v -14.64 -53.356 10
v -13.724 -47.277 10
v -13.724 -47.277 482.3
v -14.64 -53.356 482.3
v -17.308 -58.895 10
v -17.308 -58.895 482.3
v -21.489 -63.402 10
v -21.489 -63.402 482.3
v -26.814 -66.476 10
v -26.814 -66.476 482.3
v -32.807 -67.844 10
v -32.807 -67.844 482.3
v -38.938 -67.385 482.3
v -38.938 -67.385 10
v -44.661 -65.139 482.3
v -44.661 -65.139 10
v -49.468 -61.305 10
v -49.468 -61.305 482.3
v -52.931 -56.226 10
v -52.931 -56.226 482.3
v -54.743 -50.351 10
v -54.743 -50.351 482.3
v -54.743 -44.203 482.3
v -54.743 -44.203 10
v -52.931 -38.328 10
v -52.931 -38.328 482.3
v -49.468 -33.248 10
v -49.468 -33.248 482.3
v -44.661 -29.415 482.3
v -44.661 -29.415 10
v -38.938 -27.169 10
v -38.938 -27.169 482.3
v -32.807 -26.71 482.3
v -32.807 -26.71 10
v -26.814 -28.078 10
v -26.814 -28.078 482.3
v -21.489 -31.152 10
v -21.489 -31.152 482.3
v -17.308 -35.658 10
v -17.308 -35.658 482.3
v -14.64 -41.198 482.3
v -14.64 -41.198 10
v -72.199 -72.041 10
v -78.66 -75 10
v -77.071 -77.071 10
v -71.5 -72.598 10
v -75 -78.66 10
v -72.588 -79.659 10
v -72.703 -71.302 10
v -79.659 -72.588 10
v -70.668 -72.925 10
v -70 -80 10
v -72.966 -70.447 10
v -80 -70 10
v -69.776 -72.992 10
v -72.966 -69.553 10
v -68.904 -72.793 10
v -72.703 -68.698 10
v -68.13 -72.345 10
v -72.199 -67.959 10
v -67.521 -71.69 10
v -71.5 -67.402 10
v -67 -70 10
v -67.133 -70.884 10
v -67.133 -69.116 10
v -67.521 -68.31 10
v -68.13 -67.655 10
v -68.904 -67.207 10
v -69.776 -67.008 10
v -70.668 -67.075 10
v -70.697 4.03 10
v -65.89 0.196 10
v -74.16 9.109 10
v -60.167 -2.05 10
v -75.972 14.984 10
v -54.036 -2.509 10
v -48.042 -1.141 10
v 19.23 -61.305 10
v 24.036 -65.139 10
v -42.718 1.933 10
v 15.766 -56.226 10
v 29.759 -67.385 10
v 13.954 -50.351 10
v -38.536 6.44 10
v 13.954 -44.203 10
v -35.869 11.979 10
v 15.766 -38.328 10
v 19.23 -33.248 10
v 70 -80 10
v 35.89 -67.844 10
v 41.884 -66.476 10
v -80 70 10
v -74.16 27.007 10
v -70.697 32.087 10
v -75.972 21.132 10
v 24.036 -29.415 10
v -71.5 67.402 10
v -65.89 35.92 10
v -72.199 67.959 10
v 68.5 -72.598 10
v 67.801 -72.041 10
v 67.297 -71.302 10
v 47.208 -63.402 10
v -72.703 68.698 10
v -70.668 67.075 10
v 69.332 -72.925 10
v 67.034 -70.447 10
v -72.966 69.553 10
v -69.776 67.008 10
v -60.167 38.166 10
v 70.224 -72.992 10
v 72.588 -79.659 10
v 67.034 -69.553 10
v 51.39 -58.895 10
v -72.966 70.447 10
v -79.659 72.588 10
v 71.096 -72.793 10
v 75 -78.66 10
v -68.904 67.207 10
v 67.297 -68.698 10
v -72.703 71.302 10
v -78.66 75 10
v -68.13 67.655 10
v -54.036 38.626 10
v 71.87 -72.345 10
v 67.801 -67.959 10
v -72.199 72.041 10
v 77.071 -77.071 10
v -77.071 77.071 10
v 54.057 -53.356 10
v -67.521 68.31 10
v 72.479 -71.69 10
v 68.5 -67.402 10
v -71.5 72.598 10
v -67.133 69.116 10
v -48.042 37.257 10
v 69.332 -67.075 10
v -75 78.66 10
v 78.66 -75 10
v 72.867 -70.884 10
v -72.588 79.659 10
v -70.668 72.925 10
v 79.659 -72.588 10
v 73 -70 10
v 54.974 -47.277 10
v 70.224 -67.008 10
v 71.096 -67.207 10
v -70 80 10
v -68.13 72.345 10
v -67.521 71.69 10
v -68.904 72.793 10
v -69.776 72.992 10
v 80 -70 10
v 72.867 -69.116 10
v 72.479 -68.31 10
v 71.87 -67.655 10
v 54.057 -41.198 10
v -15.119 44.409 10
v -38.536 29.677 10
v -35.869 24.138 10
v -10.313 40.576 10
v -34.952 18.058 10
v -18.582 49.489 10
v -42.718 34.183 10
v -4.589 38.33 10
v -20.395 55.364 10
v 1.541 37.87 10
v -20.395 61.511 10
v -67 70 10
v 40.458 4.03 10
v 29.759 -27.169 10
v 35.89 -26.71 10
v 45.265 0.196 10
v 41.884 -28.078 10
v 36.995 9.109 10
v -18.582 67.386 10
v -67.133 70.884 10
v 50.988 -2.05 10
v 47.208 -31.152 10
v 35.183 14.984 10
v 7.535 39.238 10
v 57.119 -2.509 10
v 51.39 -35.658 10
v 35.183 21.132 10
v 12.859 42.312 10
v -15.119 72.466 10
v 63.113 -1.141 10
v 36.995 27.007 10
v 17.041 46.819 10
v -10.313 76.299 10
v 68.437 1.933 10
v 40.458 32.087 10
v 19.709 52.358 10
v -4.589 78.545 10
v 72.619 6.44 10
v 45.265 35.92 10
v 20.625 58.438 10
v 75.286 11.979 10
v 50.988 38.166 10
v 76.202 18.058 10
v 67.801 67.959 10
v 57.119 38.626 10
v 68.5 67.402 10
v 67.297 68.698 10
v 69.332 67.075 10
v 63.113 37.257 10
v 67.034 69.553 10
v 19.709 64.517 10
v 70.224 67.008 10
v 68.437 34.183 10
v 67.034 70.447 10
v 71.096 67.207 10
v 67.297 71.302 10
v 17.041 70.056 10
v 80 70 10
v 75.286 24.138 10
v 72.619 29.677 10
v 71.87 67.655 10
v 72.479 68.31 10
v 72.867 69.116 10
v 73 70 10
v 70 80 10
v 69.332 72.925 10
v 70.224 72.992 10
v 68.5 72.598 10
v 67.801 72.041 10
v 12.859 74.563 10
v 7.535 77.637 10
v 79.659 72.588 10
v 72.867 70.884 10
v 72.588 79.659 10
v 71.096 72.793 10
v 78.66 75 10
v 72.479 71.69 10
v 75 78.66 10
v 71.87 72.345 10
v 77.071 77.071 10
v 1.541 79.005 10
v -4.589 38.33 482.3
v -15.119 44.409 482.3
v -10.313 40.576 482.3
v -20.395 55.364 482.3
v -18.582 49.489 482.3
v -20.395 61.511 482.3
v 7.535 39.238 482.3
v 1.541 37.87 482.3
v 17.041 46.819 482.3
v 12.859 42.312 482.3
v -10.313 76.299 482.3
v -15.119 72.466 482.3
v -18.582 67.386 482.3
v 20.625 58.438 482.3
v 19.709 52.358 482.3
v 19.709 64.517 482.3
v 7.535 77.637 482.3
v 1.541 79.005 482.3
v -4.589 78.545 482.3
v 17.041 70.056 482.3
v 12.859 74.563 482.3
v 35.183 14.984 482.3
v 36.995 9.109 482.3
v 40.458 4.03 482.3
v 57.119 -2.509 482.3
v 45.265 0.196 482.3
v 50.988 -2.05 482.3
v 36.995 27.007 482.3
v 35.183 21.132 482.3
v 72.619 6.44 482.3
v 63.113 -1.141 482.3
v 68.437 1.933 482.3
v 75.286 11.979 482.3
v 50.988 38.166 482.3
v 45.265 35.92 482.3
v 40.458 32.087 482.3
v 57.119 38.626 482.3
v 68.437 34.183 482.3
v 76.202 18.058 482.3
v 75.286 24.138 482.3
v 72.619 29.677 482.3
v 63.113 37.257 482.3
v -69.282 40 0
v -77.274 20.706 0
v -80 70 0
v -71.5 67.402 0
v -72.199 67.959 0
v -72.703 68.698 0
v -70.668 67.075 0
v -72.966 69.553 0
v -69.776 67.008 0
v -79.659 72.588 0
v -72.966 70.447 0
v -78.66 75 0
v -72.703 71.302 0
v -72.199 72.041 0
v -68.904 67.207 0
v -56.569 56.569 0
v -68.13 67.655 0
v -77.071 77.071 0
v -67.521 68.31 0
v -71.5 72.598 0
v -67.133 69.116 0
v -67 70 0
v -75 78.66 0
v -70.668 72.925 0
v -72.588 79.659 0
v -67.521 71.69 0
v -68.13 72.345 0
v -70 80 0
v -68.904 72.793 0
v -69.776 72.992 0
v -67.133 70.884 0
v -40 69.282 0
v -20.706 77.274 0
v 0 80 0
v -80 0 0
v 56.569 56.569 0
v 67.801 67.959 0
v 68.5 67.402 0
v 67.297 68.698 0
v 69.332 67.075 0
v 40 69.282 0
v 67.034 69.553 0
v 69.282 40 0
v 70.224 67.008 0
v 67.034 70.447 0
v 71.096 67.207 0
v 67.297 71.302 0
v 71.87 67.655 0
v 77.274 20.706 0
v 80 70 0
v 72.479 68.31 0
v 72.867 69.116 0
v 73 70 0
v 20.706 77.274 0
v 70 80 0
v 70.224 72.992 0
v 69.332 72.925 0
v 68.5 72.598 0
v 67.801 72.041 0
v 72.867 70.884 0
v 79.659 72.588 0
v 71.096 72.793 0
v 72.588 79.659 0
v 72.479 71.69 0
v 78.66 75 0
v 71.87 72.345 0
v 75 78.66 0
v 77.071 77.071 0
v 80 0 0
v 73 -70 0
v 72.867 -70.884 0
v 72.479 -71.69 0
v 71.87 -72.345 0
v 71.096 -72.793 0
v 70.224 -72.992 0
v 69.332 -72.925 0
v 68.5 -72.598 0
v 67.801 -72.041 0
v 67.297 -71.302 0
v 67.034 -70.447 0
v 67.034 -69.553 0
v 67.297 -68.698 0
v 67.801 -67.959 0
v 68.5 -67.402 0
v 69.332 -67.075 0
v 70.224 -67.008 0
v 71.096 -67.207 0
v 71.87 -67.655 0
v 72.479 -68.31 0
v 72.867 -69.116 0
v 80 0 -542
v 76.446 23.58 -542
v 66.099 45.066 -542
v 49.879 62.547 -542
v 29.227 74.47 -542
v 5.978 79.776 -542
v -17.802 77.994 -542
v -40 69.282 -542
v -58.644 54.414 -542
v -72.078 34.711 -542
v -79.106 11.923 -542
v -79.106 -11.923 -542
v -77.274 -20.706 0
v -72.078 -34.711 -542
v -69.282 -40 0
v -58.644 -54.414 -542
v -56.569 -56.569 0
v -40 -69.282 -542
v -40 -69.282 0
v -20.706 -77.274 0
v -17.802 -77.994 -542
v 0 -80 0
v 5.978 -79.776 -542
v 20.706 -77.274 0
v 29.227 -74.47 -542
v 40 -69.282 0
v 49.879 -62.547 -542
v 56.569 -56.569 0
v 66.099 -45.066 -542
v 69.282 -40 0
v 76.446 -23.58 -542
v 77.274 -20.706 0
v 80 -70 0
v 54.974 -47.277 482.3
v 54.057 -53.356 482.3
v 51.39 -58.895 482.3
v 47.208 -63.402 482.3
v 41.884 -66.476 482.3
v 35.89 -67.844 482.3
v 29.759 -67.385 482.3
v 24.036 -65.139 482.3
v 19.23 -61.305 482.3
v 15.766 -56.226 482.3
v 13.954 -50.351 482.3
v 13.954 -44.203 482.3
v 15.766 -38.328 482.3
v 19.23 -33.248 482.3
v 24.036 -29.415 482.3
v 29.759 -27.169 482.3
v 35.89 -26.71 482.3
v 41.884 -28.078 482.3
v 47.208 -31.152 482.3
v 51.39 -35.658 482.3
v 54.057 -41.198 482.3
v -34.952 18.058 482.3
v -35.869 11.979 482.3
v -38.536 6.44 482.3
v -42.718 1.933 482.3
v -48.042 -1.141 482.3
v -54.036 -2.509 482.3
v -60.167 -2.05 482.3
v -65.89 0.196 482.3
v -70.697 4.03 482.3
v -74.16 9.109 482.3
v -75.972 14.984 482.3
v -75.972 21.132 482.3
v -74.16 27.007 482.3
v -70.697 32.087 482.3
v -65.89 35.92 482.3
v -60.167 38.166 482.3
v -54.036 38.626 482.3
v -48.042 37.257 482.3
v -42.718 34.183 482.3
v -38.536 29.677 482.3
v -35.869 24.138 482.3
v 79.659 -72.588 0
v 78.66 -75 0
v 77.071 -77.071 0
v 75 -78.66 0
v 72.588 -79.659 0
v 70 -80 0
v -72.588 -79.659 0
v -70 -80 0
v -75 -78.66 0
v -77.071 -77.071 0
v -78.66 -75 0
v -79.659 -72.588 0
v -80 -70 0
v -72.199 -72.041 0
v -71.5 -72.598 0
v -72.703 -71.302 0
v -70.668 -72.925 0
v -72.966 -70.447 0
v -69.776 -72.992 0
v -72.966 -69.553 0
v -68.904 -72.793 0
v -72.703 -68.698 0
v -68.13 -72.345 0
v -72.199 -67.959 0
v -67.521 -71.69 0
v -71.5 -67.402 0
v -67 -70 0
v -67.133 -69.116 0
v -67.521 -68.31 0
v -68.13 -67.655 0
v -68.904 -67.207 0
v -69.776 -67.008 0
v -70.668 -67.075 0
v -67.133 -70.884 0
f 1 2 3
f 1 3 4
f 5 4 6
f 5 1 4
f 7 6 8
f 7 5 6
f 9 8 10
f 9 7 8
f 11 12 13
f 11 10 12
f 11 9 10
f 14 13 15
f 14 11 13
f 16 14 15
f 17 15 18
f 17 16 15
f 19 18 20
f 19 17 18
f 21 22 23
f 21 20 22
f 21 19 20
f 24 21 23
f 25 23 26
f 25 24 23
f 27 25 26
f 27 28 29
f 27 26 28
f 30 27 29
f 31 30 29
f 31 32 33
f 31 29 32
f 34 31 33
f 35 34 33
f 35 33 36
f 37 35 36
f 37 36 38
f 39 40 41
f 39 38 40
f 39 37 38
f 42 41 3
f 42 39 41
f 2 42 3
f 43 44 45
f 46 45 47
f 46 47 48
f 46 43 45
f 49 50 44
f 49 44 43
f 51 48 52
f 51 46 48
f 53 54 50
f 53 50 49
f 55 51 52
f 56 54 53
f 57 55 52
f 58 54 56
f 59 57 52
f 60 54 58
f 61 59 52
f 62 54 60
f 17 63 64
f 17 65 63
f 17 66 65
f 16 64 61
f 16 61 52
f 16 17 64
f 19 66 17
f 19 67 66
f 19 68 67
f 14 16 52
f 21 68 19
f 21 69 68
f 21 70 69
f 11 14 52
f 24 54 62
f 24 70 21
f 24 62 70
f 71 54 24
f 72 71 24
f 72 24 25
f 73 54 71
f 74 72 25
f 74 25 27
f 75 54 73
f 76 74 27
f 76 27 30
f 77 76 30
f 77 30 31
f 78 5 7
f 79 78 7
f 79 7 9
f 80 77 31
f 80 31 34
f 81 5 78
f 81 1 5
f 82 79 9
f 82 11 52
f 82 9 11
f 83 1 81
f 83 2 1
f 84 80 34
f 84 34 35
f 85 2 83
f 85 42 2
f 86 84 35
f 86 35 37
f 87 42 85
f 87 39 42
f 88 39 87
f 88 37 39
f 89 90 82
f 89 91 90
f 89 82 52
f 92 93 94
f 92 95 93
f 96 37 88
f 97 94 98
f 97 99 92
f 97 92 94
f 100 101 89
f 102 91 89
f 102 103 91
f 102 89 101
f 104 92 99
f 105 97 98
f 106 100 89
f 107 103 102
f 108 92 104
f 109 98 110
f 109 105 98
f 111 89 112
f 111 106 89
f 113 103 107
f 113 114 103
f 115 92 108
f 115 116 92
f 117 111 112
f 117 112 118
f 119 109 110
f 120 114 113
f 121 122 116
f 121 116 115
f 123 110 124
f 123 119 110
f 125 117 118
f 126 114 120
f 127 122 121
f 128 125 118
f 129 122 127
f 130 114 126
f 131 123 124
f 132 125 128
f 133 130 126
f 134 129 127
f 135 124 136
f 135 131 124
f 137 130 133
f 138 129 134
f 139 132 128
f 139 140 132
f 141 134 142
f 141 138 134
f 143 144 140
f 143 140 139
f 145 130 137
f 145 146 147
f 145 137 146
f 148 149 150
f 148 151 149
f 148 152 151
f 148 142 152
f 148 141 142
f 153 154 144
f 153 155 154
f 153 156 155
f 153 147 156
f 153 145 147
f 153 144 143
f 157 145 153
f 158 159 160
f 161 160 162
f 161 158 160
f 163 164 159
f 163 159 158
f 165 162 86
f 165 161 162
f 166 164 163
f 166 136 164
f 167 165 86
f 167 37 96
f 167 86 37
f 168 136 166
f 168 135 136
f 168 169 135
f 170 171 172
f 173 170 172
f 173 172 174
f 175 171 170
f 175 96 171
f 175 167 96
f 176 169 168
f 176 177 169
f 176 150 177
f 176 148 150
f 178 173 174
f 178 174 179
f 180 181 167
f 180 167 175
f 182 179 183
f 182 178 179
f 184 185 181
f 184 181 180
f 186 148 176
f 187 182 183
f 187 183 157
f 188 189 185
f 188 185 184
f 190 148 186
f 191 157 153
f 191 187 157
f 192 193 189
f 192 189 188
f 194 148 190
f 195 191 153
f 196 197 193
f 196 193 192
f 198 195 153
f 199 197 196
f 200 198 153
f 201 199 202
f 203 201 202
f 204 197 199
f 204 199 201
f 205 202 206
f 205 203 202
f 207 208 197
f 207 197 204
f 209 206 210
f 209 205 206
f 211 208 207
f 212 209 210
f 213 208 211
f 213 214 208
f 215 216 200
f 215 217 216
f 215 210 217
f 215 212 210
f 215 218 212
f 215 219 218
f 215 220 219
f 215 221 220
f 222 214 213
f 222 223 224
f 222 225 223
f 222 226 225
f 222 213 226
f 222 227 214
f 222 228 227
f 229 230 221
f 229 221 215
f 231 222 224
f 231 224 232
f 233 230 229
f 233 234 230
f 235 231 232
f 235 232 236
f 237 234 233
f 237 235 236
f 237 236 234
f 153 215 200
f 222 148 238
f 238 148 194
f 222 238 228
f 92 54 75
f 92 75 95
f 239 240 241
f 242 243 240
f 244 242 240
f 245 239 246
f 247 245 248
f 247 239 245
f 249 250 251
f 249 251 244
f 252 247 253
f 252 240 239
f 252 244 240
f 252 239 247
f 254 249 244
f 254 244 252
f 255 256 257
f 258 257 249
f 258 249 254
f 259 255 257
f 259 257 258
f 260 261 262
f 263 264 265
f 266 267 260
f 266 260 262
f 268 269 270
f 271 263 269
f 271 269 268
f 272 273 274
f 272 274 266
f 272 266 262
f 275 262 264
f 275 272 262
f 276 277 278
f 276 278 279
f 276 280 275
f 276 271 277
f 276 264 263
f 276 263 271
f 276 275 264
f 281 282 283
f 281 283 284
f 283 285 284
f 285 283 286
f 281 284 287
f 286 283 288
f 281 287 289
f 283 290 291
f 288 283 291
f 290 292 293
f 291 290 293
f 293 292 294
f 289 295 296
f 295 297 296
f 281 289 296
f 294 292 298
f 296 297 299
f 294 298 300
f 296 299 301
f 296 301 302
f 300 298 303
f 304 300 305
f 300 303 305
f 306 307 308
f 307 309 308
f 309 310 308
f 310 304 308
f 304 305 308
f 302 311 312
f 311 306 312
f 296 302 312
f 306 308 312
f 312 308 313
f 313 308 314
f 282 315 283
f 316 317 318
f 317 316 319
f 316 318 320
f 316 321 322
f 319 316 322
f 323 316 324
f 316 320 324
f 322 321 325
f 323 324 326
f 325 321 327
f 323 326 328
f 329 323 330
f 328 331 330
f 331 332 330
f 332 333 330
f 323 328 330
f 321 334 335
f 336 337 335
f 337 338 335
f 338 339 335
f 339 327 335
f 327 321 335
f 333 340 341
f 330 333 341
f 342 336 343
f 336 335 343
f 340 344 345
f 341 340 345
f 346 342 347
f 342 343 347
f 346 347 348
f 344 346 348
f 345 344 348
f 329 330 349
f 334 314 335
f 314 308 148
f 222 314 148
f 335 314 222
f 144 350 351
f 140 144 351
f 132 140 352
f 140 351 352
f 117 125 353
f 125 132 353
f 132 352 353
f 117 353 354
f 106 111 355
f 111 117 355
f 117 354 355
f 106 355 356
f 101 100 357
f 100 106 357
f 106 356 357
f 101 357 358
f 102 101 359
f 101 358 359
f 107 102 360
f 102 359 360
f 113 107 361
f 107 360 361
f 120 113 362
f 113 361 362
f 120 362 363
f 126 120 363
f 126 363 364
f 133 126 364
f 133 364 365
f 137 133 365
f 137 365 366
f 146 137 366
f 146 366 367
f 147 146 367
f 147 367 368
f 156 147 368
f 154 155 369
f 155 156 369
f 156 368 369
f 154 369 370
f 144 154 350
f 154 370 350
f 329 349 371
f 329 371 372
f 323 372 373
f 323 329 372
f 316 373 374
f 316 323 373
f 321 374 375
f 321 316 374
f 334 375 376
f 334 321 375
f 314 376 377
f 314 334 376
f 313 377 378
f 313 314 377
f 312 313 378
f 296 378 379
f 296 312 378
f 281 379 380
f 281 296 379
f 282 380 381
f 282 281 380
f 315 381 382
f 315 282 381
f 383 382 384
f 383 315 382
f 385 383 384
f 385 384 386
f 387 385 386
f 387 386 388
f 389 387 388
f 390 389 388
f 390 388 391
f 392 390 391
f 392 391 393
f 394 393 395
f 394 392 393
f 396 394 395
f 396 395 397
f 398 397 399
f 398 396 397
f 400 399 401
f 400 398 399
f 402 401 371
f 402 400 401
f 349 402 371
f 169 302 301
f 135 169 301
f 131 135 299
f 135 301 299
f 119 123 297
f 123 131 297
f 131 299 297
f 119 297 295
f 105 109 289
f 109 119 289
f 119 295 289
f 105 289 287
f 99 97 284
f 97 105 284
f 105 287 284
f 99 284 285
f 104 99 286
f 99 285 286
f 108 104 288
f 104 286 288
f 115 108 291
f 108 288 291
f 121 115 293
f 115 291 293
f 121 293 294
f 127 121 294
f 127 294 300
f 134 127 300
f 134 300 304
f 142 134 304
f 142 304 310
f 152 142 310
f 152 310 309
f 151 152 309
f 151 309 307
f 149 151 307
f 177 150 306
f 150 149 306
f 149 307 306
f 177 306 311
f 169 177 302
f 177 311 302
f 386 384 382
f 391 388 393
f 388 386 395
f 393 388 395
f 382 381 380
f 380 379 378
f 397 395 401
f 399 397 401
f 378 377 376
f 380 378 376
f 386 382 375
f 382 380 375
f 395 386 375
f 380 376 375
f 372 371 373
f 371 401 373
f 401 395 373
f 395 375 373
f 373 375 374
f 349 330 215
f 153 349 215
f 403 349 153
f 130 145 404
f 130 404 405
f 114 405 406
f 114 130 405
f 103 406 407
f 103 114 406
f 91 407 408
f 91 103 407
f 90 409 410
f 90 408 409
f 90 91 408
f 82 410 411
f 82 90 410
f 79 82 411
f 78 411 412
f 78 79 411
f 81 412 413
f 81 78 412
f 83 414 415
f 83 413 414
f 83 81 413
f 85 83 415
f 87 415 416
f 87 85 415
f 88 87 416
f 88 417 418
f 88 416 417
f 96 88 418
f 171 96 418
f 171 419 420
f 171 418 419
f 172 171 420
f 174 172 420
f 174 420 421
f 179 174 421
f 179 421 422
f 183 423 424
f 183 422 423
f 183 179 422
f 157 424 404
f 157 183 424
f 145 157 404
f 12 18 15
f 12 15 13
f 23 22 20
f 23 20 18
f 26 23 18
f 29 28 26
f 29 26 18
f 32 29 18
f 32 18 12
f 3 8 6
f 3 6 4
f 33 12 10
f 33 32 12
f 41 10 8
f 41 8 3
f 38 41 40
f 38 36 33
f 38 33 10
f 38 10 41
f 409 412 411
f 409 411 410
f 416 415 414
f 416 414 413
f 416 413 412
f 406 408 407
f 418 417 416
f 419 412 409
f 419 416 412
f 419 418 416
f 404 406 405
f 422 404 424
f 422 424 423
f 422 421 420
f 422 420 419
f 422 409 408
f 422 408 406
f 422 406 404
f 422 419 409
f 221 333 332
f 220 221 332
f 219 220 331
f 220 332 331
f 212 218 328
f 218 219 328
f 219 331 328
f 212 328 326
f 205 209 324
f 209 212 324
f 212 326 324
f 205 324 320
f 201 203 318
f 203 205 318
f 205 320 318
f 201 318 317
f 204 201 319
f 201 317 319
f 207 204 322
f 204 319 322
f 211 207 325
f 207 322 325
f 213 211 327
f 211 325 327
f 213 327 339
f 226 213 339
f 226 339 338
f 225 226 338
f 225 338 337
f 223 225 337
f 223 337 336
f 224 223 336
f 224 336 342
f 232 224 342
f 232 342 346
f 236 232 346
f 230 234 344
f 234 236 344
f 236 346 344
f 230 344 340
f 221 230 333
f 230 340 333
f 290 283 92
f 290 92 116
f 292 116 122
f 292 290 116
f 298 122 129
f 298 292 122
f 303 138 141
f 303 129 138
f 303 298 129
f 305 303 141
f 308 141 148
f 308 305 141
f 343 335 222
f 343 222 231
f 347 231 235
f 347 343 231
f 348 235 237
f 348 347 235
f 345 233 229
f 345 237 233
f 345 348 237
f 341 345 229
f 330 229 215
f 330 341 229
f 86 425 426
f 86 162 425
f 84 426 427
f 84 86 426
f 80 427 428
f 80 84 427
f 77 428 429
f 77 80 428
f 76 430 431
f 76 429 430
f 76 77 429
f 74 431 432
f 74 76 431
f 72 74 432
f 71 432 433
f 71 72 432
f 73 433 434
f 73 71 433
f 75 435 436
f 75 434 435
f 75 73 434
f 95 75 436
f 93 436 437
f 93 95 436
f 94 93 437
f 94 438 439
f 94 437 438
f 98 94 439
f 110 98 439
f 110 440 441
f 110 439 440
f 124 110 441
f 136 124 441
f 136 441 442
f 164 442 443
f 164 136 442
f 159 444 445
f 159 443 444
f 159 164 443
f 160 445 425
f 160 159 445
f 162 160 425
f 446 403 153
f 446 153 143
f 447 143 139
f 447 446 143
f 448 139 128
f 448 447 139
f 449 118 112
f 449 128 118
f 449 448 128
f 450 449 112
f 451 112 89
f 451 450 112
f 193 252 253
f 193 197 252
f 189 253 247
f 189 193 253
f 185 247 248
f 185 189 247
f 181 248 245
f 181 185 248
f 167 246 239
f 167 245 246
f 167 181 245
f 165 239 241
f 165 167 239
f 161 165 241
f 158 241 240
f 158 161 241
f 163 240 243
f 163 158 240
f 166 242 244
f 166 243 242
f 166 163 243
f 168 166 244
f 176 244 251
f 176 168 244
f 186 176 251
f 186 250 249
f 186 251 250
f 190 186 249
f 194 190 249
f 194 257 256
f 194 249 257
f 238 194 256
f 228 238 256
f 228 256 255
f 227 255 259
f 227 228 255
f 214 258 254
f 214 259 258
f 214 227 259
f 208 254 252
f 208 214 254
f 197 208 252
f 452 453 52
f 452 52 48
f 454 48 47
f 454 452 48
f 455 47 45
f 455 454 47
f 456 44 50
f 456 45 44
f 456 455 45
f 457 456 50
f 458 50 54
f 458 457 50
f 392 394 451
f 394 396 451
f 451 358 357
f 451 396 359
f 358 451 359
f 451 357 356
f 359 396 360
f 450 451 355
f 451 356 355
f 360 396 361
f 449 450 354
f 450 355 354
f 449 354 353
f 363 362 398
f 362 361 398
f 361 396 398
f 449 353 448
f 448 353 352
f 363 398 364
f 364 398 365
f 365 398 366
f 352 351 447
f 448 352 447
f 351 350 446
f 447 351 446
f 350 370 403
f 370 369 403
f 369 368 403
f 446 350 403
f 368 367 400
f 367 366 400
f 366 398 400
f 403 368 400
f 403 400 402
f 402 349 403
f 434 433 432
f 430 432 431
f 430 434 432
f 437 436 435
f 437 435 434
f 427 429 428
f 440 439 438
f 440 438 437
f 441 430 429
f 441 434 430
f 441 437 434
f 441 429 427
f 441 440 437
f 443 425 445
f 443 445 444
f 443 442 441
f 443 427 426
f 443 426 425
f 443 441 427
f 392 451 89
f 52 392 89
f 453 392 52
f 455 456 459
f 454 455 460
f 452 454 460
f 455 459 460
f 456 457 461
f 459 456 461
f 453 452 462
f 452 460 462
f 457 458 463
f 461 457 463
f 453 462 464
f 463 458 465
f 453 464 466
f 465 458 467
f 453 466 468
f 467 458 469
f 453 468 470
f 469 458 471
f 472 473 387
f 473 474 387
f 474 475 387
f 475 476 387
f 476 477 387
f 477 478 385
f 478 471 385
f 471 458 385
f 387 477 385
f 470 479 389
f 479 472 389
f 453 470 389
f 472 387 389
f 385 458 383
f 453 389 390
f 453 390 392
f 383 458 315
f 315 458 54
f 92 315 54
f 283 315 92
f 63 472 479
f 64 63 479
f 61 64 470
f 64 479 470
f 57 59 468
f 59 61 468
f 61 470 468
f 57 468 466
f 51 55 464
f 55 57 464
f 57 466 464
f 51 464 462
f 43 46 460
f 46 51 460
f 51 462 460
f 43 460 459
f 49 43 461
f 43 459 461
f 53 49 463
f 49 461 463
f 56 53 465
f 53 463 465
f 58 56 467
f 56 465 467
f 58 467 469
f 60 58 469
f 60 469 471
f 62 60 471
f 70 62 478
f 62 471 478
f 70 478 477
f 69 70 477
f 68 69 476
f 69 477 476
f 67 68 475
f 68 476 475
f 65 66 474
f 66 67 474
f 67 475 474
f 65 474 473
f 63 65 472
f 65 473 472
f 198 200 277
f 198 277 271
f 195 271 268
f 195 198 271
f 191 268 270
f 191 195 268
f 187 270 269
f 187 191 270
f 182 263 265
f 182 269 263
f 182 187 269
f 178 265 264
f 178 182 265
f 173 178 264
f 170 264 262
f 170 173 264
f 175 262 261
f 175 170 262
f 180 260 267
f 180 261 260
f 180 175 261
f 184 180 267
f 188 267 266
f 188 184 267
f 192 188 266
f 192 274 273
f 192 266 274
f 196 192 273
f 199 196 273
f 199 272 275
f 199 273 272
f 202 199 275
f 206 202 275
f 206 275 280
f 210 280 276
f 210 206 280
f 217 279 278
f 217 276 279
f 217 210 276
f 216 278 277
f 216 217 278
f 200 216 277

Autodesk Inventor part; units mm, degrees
ref_plane "YZ Plane" through (0, 0, 0) normal (1, 0, 0) x (0, 1, 0)
ref_plane "XZ Plane" through (0, 0, 0) normal (0, 1, 0) x (-1, 0, 0)
ref_plane "XY Plane" through (0, 0, 0) normal (0, 0, 1) x (1, 0, 0)
sketch "Boceto1" plane through (0, 0, 0) normal (0, 0, 1) x (1, 0, 0)
  circle A0 centre (0, 0) radius 80
  dimension "d0" = 160
extrude "Extrusión1" add sketch "Boceto1" against normal blind 542
sketch "Boceto2" plane through (0, 0, 0) normal (0, 0, 1) x (1, 0, 0)
  line L0 (-70, 80) -> (70, 80)
  line L1 (80, 70) -> (80, -70)
  line L2 (70, -80) -> (-70, -80)
  line L3 (-80, -70) -> (-80, 70)
  circle A0 centre (0, 0) radius 80 construction
  circle A1 centre (-70, 70) radius 3
  arc A2 (-70, 80) -> (-80, 70) centre (-70, 70) ccw
  arc A3 (80, 70) -> (70, 80) centre (70, 70) ccw
  arc A4 (70, -80) -> (80, -70) centre (70, -70) ccw
  arc A5 (-80, -70) -> (-70, -80) centre (-70, -70) ccw
  circle A6 centre (-70, -70) radius 3
  circle A7 centre (70, -70) radius 3
  circle A8 centre (70, 70) radius 3
  dimension "d4" = 6
  dimension "d5" = 10
  dimension "d6" = 10
  dimension "d7" = 10
  dimension "d10" = 360
extrude "Extrusión2" add sketch "Boceto2" along normal blind 10
sketch "Boceto3" plane through (0, 0, 10) normal (0, 0, 1) x (1, 0, 0)
  circle A0 centre (0, 0) radius 58.4375 construction
  circle A1 centre (0, 58.4375) radius 20.625
  circle A2 centre (0, 0) radius 58.4375 construction
  circle A3 centre (-55.5774, 18.0582) radius 20.625
  circle A4 centre (0, 0) radius 58.4375 construction
  circle A5 centre (-34.3487, -47.2769) radius 20.625
  circle A6 centre (0, 0) radius 58.4375 construction
  circle A7 centre (34.3487, -47.2769) radius 20.625
  circle A8 centre (0, 0) radius 58.4375 construction
  circle A9 centre (55.5774, 18.0582) radius 20.625
  dimension "d14" = 116.875
  dimension "d15" = 41.25
  dimension "d18" = 360
extrude "Extrusión3" add sketch "Boceto3" along normal blind 472.3
equation "\"d1\" = 2 * ancho_llanta"
equation "\"d6\" = d5"
equation "\"ancho_llanta\" = 271"
properties part number "atornillador" material "Acero inoxidable, pulido"
